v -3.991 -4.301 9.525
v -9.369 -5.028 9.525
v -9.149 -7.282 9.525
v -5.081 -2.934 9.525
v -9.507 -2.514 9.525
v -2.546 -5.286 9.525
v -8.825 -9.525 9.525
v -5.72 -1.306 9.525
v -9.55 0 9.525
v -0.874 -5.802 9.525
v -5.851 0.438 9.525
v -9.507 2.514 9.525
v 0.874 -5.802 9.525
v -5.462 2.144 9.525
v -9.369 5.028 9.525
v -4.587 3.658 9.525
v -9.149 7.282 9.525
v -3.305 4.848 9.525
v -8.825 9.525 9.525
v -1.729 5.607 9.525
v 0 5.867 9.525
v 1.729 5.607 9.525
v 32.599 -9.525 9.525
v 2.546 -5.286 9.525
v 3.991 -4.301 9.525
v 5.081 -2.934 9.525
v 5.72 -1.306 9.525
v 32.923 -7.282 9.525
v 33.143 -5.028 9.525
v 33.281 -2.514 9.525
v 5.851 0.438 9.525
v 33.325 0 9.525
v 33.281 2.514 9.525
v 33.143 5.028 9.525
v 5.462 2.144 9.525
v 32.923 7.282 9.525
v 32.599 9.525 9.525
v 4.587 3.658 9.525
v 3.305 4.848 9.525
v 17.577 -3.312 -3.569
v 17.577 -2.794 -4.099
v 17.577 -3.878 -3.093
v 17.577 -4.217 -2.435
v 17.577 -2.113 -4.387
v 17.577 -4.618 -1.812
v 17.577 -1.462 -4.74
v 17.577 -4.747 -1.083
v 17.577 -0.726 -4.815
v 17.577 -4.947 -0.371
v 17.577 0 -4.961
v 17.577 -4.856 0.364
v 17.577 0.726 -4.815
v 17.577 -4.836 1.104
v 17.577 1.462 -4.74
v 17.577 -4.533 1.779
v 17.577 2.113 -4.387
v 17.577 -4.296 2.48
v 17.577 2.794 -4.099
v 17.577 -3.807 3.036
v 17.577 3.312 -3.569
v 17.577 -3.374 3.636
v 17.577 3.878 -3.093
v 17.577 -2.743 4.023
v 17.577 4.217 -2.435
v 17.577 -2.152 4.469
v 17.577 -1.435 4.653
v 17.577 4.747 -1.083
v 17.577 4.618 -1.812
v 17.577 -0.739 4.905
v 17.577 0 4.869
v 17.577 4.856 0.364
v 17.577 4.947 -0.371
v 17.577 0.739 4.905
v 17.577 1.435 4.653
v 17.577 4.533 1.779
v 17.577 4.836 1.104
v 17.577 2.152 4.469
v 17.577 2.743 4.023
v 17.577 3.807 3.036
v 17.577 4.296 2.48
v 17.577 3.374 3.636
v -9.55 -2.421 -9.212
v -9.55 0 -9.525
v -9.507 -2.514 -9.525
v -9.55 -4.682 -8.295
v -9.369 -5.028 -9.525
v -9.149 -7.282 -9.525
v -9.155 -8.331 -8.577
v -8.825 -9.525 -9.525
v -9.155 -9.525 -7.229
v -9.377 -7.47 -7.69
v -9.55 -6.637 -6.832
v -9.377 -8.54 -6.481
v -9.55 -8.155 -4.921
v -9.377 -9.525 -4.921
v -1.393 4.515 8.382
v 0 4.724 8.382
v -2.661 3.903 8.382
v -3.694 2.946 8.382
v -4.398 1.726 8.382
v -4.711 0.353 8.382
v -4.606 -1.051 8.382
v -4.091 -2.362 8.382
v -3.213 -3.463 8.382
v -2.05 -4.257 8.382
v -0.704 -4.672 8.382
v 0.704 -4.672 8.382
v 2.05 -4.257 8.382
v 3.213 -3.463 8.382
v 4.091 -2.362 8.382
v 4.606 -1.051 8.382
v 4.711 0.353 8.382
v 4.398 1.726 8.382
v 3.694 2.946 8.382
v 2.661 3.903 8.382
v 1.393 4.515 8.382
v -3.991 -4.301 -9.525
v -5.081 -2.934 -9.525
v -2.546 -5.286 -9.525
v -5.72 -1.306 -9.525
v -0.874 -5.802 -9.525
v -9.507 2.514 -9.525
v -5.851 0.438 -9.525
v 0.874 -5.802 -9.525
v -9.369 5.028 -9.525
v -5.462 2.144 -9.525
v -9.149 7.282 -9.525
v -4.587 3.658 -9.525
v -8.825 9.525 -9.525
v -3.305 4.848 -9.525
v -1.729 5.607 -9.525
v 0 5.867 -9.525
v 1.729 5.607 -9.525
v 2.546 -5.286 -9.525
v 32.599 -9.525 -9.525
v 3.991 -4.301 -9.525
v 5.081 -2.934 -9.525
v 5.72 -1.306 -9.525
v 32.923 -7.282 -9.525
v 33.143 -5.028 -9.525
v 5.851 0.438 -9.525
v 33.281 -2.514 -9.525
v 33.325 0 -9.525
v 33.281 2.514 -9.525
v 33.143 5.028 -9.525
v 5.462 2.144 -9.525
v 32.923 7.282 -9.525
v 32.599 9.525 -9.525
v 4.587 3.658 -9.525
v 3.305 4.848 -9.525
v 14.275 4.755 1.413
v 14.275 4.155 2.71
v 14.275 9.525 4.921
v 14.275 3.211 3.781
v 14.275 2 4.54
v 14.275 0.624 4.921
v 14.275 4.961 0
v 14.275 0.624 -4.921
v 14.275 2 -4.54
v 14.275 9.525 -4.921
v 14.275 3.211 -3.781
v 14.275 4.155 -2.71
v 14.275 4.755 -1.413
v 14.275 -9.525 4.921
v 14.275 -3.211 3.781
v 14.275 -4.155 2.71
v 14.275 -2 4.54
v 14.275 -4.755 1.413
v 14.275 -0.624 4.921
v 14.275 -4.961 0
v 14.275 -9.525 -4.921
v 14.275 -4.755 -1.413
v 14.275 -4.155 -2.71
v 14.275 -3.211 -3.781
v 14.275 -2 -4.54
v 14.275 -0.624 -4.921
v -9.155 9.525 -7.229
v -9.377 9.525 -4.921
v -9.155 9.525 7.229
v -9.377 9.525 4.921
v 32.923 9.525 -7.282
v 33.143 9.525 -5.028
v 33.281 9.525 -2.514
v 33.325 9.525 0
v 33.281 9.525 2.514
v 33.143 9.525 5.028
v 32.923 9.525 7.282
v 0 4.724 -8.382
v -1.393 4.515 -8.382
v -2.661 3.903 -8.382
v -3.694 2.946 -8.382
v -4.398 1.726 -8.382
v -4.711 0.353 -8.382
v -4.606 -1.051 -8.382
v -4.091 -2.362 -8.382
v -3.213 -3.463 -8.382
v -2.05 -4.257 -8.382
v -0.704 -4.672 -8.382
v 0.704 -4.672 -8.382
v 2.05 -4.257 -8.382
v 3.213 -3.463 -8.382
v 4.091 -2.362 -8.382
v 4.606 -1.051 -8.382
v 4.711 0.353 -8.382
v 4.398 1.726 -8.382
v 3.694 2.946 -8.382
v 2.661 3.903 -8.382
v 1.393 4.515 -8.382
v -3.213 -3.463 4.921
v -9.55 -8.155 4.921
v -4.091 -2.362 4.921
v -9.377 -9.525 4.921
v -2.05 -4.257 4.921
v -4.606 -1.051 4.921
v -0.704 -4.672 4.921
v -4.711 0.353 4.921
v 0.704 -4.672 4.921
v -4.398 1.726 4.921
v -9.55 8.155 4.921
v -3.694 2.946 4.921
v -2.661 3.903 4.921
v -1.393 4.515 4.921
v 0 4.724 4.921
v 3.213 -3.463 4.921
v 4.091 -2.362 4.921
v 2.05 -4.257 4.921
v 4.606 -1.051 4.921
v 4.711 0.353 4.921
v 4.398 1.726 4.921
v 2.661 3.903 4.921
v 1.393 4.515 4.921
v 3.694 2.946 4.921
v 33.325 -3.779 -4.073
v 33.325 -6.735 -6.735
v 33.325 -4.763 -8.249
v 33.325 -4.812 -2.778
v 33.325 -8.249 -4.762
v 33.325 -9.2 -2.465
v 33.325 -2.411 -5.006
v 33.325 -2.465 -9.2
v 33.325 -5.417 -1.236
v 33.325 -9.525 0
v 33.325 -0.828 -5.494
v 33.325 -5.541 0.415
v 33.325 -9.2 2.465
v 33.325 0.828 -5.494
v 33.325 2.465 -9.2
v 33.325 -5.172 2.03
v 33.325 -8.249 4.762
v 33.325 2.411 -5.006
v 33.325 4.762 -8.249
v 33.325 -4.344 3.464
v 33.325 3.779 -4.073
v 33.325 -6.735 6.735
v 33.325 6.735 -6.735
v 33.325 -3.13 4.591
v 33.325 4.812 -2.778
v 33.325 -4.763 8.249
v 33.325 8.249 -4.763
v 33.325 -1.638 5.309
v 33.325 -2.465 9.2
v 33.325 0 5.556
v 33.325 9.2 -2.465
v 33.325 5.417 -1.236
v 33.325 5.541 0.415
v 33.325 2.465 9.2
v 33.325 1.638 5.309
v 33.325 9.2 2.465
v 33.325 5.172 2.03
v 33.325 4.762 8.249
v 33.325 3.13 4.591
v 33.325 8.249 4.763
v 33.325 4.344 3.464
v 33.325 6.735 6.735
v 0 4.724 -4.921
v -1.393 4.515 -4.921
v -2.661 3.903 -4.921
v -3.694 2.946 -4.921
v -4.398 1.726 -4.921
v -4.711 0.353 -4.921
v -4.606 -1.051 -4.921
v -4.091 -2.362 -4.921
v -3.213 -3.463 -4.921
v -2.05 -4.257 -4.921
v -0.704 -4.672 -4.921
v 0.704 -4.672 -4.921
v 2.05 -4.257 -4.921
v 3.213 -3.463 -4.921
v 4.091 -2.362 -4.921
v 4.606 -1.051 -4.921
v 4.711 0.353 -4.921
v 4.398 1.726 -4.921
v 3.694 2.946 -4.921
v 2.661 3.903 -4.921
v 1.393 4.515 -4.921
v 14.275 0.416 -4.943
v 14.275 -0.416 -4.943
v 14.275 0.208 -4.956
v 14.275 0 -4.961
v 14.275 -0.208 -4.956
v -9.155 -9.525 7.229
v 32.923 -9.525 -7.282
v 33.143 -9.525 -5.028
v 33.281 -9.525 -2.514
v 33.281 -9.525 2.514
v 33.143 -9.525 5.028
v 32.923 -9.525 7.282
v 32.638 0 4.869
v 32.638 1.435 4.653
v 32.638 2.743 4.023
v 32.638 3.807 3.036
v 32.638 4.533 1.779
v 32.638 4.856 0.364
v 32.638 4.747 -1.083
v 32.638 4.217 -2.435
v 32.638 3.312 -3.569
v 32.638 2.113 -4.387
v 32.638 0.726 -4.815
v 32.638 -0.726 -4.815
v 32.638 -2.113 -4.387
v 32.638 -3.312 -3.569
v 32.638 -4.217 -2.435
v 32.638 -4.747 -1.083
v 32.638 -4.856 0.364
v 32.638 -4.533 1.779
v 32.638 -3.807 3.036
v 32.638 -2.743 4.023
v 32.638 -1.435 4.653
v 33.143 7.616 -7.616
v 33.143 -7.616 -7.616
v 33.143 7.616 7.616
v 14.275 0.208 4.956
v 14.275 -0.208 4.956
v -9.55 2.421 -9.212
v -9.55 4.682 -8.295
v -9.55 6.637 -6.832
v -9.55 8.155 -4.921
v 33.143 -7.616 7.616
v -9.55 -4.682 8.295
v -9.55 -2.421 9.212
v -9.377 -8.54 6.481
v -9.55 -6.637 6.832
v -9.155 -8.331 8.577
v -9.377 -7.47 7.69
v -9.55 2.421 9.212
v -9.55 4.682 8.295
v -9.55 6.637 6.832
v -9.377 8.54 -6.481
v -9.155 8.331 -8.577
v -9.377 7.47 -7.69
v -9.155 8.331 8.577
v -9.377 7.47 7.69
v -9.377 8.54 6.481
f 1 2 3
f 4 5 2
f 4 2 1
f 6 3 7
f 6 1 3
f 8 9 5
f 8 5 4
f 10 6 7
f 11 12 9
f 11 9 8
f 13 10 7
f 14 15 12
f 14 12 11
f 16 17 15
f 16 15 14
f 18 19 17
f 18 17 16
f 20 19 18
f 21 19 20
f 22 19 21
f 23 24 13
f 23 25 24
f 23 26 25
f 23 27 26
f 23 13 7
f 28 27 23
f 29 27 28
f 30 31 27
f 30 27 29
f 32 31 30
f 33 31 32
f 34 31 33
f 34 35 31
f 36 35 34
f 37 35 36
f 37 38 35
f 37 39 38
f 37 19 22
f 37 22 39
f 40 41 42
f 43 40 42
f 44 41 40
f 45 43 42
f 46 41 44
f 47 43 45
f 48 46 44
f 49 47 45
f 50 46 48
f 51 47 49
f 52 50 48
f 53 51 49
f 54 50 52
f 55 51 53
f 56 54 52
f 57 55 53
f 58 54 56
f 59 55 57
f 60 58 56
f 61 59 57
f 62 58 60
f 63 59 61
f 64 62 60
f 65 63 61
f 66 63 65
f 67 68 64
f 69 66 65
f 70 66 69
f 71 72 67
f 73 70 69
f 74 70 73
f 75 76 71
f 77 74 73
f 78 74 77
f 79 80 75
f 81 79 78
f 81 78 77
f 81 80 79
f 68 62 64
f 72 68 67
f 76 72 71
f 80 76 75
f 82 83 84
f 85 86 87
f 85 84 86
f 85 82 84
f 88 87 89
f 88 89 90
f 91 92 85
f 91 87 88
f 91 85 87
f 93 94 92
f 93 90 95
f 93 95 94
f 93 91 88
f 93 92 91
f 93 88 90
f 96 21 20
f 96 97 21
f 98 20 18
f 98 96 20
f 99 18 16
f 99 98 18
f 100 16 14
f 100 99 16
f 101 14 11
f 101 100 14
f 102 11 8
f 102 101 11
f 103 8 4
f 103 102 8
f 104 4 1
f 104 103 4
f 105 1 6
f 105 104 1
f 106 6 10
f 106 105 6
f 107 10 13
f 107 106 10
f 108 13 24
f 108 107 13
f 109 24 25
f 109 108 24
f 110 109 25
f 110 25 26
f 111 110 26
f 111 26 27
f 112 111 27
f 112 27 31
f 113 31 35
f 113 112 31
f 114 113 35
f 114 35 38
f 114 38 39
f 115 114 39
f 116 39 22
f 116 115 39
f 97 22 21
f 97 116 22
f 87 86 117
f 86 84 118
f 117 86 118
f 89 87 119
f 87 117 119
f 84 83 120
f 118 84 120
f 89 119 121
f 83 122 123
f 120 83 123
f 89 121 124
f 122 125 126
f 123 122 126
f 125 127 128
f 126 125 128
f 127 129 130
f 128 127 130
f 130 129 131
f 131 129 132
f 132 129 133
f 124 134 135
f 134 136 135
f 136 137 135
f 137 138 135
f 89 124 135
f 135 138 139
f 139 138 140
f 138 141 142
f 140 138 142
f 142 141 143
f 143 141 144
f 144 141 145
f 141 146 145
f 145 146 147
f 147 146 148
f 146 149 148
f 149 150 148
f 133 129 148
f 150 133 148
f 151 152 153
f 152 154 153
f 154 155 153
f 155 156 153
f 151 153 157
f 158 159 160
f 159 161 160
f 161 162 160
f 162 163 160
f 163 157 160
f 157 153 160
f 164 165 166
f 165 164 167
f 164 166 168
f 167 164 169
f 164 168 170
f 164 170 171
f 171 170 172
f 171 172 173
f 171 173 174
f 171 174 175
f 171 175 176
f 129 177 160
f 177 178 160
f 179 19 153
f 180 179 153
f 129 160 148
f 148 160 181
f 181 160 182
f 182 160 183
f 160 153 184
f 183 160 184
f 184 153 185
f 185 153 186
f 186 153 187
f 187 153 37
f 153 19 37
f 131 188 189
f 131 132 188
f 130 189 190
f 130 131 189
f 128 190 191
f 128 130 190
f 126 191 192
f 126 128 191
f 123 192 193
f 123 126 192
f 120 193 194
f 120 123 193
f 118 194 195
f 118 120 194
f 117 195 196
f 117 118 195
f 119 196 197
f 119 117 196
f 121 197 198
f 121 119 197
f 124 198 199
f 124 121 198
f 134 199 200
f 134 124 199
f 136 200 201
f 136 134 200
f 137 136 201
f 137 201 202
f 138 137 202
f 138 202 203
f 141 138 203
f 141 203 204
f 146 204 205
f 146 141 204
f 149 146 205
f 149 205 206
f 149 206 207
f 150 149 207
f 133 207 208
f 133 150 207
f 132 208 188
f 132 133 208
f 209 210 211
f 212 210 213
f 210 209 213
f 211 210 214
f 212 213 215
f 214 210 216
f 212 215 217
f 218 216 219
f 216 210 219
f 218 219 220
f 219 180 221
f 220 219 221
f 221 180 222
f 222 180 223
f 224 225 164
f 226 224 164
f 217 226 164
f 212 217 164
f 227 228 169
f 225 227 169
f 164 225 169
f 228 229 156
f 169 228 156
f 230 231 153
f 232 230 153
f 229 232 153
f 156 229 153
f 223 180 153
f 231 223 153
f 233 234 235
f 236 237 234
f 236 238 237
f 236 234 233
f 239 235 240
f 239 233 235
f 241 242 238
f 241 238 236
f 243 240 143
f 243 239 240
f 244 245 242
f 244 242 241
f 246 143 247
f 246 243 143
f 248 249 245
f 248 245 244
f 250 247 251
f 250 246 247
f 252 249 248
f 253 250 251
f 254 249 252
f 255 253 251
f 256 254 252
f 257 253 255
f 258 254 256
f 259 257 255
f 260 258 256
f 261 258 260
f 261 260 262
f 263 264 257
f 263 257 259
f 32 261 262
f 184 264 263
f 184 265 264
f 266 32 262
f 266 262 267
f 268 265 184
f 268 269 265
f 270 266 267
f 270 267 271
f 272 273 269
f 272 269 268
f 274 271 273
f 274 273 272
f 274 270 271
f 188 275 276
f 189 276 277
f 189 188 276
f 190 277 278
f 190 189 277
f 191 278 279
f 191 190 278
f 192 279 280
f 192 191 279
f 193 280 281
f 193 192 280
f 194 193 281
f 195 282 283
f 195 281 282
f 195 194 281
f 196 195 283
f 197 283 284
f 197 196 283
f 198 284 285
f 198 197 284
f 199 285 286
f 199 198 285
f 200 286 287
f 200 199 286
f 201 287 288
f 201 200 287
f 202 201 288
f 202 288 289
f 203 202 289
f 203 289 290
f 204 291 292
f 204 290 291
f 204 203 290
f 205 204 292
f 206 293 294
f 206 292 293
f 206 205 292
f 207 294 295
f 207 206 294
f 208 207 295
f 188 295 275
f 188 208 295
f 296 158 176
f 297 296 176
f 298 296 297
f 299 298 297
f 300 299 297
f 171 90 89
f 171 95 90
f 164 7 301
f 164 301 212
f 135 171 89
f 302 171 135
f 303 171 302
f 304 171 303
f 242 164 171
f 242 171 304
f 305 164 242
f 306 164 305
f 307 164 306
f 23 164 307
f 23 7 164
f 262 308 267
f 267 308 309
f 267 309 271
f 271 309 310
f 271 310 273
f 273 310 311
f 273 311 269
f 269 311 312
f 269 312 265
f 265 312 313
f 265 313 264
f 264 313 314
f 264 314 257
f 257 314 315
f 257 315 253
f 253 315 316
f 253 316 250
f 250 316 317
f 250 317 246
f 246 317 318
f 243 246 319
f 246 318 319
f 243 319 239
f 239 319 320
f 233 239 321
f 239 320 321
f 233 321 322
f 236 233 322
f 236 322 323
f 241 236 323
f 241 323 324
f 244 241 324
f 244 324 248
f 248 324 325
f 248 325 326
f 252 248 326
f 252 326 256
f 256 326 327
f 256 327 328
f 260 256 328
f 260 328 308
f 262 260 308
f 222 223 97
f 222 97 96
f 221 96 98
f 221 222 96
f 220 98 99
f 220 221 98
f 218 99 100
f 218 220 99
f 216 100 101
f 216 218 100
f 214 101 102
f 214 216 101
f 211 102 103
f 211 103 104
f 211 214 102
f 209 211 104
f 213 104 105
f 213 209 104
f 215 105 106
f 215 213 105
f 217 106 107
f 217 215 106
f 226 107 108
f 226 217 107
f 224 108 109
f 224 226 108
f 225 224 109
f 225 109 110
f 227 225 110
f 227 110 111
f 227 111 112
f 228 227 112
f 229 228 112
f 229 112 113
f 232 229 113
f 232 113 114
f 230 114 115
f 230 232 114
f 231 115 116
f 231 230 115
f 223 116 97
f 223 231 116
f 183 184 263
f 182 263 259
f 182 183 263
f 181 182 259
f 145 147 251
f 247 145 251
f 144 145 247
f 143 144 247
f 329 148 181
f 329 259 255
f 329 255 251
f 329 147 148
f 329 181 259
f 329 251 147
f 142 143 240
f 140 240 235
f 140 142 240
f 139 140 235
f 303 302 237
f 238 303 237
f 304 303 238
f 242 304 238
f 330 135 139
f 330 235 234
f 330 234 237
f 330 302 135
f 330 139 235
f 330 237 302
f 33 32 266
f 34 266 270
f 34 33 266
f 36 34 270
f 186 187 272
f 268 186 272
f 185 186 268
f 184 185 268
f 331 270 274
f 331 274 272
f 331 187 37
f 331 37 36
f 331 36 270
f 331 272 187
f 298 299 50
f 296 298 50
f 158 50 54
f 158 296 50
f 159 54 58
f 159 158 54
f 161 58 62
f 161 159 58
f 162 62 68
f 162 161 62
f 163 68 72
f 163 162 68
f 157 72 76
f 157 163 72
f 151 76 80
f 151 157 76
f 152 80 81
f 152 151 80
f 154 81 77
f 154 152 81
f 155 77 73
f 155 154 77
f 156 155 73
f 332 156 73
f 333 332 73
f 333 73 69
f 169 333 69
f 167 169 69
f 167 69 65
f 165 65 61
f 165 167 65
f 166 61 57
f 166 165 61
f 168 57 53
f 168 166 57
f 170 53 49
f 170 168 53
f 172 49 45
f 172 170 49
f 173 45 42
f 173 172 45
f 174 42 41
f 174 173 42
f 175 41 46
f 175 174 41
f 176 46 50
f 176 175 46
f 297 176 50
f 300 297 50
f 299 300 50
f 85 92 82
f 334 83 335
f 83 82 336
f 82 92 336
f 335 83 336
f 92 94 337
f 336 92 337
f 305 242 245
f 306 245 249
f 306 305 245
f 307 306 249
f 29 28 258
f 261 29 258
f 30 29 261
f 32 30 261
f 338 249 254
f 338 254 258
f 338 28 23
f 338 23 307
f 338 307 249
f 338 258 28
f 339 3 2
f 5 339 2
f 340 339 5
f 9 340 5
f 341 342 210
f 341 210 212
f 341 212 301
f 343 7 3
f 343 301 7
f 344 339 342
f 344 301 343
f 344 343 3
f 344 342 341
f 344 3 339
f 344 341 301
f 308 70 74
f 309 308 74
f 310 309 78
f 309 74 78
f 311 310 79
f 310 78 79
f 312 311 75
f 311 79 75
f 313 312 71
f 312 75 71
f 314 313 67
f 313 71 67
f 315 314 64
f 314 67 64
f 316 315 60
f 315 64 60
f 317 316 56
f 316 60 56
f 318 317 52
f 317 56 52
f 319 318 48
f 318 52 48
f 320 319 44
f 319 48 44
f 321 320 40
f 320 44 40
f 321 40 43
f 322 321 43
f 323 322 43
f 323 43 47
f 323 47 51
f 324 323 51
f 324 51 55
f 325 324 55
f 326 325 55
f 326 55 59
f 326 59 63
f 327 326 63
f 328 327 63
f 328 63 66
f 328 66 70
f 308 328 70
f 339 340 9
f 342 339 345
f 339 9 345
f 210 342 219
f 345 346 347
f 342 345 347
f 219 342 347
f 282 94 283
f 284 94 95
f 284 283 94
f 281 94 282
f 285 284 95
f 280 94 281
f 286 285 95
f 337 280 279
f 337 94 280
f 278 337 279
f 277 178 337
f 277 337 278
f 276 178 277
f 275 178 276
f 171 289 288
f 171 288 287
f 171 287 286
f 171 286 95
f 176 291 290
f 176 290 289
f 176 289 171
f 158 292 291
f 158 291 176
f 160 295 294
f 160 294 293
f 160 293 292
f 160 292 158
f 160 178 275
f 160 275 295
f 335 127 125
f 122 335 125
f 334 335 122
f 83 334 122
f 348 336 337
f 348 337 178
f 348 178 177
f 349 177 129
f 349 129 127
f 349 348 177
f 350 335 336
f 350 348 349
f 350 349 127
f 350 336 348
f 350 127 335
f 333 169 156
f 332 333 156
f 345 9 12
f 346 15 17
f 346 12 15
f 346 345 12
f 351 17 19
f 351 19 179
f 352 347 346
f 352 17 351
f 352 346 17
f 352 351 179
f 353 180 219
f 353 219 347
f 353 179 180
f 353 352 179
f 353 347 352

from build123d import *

# Parameters (mm, degrees)
BOSS_EXTRUDE1_DEPTH      = 9.525
BOSS_EXTRUDE1_DEPTH_BACK = 9.525
SKETCH1_W                = 42.8752
SKETCH1_H                = 19.05
CUT_EXTRUDE1_DEPTH       = 9.525
CUT_EXTRUDE1_DEPTH_BACK  = 9.525
SKETCH2_W                = 23.8252
SKETCH2_H                = 9.8425
HOLE1_D                  = 9.73836
HOLE1_DEPTH              = 15.748
HOLE1_CSINK_D            = 11.1125
HOLE1_CSINK_ANGLE        = 90
SKETCH5_W                = 4.96062
SKETCH5_H                = 3.302


with BuildPart() as part:
    # Sketch1 → Boss-Extrude1 (new, two sides: drawn at the far end of the back side and taken through both)
    with BuildSketch(Plane.XY.offset(-BOSS_EXTRUDE1_DEPTH_BACK)):
        with Locations((11.8872, 0)):
            Rectangle(SKETCH1_W, SKETCH1_H)
    extrude(amount=BOSS_EXTRUDE1_DEPTH + BOSS_EXTRUDE1_DEPTH_BACK)

    # Sketch2 → Cut-Extrude1 (cut, two sides: drawn at the far end of the back side and taken through both)
    with BuildSketch(Plane(origin=(0, 0, 0), x_dir=(1, 0, 0), z_dir=(0, 1, 0)).offset(-CUT_EXTRUDE1_DEPTH_BACK)):
        with Locations((2.3622, 0)):
            Rectangle(SKETCH2_W, SKETCH2_H)
    extrude(amount=CUT_EXTRUDE1_DEPTH + CUT_EXTRUDE1_DEPTH_BACK, mode=Mode.SUBTRACT)

    # Hole1
    with Locations(Plane(origin=(33.3248, 0, 0), x_dir=(0, 0, -1), z_dir=(1, 0, 0))):
        with Locations((0, 0)):
            CounterSinkHole(HOLE1_D / 2, HOLE1_CSINK_D / 2, depth=HOLE1_DEPTH, counter_sink_angle=HOLE1_CSINK_ANGLE)

    # Sketch5 → Hole2 (revolve, cut)
    with BuildSketch(Plane(origin=(17.5768, 0, 0), x_dir=(0, 0, -1), z_dir=(0, 1, 0))):
        with Locations((2.48031, 1.651)):
            Rectangle(SKETCH5_W, SKETCH5_H)
    revolve(axis=Axis((-92.4232, 0, 0), (1, 0, 0)), mode=Mode.SUBTRACT)

    # Sketch7 → Cut-Revolve1 (revolve, cut)
    with BuildSketch(Plane(origin=(0, 0, 0), x_dir=(0, 0, -1), z_dir=(1, 0, 0))):
        Polygon((-9.525, 0), (-9.525, 5.8674), (-8.382, 4.7244), (8.382, 4.7244), (9.525, 5.8674), (9.525, 0), align=None)
    revolve(axis=Axis((0, 0, -9.525), (0, 0, 1)), mode=Mode.SUBTRACT)

    # Sketch8 → Cut-Revolve2 (revolve, cut)
    with BuildSketch(Plane.XY):
        with BuildLine():
            Line((33.3248, 0), (33.3248, 9.525))
            ThreePointArc((33.3248, 9.525), (32.370901294, 14.371793679), (30.7848, 19.05))
            Line((30.7848, 19.05), (42.8498, 19.05))
            Line((42.8498, 19.05), (42.8498, 0))
            Line((42.8498, 0), (33.3248, 0))
        make_face()
    revolve(axis=Axis((42.8498, 0, 0), (-1, 0, 0)), mode=Mode.SUBTRACT)

    # Sketch9 → Cut-Revolve3 (revolve, cut)
    with BuildSketch(Plane.XY):
        with BuildLine():
            Line((-19.0754, 0), (-19.0754, 19.05))
            Line((-19.0754, 19.05), (-7.0104, 19.05))
            ThreePointArc((-7.0104, 19.05), (-8.596501294, 14.371793679), (-9.5504, 9.525))
            Line((-9.5504, 9.525), (-9.5504, 0))
            Line((-9.5504, 0), (-19.0754, 0))
        make_face()
    revolve(axis=Axis((-9.5504, 0, 0), (-1, 0, 0)), mode=Mode.SUBTRACT)


solid = part.part
